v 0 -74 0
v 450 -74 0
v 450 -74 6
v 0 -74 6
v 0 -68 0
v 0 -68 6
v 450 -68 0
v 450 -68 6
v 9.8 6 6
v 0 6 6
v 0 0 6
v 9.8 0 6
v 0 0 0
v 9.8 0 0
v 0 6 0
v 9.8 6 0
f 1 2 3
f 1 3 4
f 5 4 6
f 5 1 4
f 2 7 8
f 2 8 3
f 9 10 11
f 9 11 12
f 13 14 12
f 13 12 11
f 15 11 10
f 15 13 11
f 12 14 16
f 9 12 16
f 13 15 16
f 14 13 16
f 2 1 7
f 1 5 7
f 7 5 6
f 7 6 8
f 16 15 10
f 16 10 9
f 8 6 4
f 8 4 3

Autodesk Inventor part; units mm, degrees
ref_plane "YZ Plane" through (0, 0, 0) normal (1, 0, 0) x (0, 1, 0)
ref_plane "XZ Plane" through (0, 0, 0) normal (0, 1, 0) x (-1, 0, 0)
ref_plane "XY Plane" through (0, 0, 0) normal (0, 0, 1) x (1, 0, 0)
ref_plane "Arbeitsebene1" through (0, 0, 0) normal (0, 0, 1) x (1, 0, 0)
sketch "Skizze1" plane through (0, 0, 0) normal (0, 0, 1) x (1, 0, 0)
  line L0 (0, 6) -> (10, 6) projected
  line L1 (10, 0) -> (0, 0) projected
  line L2 (10, 0) -> (10, 6) projected
  line L3 (462.7944, 9) -> (462.7944, 3) projected
  line L4 (0, -68) -> (10, -68) projected
  line L5 (0, 6) -> (450, 6)
  line L6 (450, 6) -> (450, -68)
  line L7 (450, -68) -> (0, -68)
  line L8 (0, -68) -> (0, 6)
  line L9 (0, -68) -> (450, -68)
  line L10 (450, -68) -> (450, -74)
  line L11 (450, -74) -> (0, -74)
  line L12 (0, -74) -> (0, -68)
  line L13 (0, 0) -> (0, 6) projected
  line L14 (129.9001, -74) -> (2.8877, -74) projected
  point P0 (450, 0)
  point P1 (442.7944, 5)
  point P2 (450, -68)
  dimension "d0" = 6
  dimension "d1" = 450
extrude "Extrusion1" add sketch "Skizze1" along normal blind 6 contours L0 L2 L1 L8 | L4 L7 L10 L11 L12
sketch "Skizze2" plane through (0, 0, 0) normal (0, 0, -1) x (1, 0, 0)
  line L0 (20, 0) -> (20, -5) projected
  line L1 (10, -5) -> (10, 0) projected
  line L2 (0, -6) -> (0, 74) projected
  line L3 (9.8, -6) -> (20.2, -6)
  line L4 (20.2, -6) -> (20.2, 0)
  line L5 (20.2, 0) -> (9.8, 0)
  line L6 (9.8, 0) -> (9.8, -6)
  point P0 (0, 0)
  dimension "d6" = 0
  dimension "d17" = 0.2
  dimension "d18" = 0.2
  dimension "d23" = 6
extrude "Extrusion2" cut sketch "Skizze2" against normal blind 6
sketch "Skizze3" plane through (20.2, 6, 0) normal (0, 1, 0) x (1, 0, 0)
  line L0 (-10.2, 0) -> (-20.2, 0) projected
  line L1 (-10.2, -6) -> (-20.2, -6) projected
  line L2 (0, 0) -> (0, -6) projected
  circle A0 centre (-5.2, -3) radius 1.5
  line L3 (-10.4, -6) -> (-10.4, 0) projected
  point P0 (4.8, 3)
  point P1 (429.8, 0)
  point P2 (429.8, -6)
  dimension "d16" = 3
  dimension "d19" = 5.2
hole "Bohrung1" [suppressed]
pattern_linear "Rechteckige Anordnung1" [suppressed]
ref_plane "Arbeitsebene2" through (300.2, -34, 0) normal (0, 1, 0) x (1, 0, 0)
mirror "Spiegeln1" [suppressed]
properties part number "00_Baseplate_Simmo_side1"
